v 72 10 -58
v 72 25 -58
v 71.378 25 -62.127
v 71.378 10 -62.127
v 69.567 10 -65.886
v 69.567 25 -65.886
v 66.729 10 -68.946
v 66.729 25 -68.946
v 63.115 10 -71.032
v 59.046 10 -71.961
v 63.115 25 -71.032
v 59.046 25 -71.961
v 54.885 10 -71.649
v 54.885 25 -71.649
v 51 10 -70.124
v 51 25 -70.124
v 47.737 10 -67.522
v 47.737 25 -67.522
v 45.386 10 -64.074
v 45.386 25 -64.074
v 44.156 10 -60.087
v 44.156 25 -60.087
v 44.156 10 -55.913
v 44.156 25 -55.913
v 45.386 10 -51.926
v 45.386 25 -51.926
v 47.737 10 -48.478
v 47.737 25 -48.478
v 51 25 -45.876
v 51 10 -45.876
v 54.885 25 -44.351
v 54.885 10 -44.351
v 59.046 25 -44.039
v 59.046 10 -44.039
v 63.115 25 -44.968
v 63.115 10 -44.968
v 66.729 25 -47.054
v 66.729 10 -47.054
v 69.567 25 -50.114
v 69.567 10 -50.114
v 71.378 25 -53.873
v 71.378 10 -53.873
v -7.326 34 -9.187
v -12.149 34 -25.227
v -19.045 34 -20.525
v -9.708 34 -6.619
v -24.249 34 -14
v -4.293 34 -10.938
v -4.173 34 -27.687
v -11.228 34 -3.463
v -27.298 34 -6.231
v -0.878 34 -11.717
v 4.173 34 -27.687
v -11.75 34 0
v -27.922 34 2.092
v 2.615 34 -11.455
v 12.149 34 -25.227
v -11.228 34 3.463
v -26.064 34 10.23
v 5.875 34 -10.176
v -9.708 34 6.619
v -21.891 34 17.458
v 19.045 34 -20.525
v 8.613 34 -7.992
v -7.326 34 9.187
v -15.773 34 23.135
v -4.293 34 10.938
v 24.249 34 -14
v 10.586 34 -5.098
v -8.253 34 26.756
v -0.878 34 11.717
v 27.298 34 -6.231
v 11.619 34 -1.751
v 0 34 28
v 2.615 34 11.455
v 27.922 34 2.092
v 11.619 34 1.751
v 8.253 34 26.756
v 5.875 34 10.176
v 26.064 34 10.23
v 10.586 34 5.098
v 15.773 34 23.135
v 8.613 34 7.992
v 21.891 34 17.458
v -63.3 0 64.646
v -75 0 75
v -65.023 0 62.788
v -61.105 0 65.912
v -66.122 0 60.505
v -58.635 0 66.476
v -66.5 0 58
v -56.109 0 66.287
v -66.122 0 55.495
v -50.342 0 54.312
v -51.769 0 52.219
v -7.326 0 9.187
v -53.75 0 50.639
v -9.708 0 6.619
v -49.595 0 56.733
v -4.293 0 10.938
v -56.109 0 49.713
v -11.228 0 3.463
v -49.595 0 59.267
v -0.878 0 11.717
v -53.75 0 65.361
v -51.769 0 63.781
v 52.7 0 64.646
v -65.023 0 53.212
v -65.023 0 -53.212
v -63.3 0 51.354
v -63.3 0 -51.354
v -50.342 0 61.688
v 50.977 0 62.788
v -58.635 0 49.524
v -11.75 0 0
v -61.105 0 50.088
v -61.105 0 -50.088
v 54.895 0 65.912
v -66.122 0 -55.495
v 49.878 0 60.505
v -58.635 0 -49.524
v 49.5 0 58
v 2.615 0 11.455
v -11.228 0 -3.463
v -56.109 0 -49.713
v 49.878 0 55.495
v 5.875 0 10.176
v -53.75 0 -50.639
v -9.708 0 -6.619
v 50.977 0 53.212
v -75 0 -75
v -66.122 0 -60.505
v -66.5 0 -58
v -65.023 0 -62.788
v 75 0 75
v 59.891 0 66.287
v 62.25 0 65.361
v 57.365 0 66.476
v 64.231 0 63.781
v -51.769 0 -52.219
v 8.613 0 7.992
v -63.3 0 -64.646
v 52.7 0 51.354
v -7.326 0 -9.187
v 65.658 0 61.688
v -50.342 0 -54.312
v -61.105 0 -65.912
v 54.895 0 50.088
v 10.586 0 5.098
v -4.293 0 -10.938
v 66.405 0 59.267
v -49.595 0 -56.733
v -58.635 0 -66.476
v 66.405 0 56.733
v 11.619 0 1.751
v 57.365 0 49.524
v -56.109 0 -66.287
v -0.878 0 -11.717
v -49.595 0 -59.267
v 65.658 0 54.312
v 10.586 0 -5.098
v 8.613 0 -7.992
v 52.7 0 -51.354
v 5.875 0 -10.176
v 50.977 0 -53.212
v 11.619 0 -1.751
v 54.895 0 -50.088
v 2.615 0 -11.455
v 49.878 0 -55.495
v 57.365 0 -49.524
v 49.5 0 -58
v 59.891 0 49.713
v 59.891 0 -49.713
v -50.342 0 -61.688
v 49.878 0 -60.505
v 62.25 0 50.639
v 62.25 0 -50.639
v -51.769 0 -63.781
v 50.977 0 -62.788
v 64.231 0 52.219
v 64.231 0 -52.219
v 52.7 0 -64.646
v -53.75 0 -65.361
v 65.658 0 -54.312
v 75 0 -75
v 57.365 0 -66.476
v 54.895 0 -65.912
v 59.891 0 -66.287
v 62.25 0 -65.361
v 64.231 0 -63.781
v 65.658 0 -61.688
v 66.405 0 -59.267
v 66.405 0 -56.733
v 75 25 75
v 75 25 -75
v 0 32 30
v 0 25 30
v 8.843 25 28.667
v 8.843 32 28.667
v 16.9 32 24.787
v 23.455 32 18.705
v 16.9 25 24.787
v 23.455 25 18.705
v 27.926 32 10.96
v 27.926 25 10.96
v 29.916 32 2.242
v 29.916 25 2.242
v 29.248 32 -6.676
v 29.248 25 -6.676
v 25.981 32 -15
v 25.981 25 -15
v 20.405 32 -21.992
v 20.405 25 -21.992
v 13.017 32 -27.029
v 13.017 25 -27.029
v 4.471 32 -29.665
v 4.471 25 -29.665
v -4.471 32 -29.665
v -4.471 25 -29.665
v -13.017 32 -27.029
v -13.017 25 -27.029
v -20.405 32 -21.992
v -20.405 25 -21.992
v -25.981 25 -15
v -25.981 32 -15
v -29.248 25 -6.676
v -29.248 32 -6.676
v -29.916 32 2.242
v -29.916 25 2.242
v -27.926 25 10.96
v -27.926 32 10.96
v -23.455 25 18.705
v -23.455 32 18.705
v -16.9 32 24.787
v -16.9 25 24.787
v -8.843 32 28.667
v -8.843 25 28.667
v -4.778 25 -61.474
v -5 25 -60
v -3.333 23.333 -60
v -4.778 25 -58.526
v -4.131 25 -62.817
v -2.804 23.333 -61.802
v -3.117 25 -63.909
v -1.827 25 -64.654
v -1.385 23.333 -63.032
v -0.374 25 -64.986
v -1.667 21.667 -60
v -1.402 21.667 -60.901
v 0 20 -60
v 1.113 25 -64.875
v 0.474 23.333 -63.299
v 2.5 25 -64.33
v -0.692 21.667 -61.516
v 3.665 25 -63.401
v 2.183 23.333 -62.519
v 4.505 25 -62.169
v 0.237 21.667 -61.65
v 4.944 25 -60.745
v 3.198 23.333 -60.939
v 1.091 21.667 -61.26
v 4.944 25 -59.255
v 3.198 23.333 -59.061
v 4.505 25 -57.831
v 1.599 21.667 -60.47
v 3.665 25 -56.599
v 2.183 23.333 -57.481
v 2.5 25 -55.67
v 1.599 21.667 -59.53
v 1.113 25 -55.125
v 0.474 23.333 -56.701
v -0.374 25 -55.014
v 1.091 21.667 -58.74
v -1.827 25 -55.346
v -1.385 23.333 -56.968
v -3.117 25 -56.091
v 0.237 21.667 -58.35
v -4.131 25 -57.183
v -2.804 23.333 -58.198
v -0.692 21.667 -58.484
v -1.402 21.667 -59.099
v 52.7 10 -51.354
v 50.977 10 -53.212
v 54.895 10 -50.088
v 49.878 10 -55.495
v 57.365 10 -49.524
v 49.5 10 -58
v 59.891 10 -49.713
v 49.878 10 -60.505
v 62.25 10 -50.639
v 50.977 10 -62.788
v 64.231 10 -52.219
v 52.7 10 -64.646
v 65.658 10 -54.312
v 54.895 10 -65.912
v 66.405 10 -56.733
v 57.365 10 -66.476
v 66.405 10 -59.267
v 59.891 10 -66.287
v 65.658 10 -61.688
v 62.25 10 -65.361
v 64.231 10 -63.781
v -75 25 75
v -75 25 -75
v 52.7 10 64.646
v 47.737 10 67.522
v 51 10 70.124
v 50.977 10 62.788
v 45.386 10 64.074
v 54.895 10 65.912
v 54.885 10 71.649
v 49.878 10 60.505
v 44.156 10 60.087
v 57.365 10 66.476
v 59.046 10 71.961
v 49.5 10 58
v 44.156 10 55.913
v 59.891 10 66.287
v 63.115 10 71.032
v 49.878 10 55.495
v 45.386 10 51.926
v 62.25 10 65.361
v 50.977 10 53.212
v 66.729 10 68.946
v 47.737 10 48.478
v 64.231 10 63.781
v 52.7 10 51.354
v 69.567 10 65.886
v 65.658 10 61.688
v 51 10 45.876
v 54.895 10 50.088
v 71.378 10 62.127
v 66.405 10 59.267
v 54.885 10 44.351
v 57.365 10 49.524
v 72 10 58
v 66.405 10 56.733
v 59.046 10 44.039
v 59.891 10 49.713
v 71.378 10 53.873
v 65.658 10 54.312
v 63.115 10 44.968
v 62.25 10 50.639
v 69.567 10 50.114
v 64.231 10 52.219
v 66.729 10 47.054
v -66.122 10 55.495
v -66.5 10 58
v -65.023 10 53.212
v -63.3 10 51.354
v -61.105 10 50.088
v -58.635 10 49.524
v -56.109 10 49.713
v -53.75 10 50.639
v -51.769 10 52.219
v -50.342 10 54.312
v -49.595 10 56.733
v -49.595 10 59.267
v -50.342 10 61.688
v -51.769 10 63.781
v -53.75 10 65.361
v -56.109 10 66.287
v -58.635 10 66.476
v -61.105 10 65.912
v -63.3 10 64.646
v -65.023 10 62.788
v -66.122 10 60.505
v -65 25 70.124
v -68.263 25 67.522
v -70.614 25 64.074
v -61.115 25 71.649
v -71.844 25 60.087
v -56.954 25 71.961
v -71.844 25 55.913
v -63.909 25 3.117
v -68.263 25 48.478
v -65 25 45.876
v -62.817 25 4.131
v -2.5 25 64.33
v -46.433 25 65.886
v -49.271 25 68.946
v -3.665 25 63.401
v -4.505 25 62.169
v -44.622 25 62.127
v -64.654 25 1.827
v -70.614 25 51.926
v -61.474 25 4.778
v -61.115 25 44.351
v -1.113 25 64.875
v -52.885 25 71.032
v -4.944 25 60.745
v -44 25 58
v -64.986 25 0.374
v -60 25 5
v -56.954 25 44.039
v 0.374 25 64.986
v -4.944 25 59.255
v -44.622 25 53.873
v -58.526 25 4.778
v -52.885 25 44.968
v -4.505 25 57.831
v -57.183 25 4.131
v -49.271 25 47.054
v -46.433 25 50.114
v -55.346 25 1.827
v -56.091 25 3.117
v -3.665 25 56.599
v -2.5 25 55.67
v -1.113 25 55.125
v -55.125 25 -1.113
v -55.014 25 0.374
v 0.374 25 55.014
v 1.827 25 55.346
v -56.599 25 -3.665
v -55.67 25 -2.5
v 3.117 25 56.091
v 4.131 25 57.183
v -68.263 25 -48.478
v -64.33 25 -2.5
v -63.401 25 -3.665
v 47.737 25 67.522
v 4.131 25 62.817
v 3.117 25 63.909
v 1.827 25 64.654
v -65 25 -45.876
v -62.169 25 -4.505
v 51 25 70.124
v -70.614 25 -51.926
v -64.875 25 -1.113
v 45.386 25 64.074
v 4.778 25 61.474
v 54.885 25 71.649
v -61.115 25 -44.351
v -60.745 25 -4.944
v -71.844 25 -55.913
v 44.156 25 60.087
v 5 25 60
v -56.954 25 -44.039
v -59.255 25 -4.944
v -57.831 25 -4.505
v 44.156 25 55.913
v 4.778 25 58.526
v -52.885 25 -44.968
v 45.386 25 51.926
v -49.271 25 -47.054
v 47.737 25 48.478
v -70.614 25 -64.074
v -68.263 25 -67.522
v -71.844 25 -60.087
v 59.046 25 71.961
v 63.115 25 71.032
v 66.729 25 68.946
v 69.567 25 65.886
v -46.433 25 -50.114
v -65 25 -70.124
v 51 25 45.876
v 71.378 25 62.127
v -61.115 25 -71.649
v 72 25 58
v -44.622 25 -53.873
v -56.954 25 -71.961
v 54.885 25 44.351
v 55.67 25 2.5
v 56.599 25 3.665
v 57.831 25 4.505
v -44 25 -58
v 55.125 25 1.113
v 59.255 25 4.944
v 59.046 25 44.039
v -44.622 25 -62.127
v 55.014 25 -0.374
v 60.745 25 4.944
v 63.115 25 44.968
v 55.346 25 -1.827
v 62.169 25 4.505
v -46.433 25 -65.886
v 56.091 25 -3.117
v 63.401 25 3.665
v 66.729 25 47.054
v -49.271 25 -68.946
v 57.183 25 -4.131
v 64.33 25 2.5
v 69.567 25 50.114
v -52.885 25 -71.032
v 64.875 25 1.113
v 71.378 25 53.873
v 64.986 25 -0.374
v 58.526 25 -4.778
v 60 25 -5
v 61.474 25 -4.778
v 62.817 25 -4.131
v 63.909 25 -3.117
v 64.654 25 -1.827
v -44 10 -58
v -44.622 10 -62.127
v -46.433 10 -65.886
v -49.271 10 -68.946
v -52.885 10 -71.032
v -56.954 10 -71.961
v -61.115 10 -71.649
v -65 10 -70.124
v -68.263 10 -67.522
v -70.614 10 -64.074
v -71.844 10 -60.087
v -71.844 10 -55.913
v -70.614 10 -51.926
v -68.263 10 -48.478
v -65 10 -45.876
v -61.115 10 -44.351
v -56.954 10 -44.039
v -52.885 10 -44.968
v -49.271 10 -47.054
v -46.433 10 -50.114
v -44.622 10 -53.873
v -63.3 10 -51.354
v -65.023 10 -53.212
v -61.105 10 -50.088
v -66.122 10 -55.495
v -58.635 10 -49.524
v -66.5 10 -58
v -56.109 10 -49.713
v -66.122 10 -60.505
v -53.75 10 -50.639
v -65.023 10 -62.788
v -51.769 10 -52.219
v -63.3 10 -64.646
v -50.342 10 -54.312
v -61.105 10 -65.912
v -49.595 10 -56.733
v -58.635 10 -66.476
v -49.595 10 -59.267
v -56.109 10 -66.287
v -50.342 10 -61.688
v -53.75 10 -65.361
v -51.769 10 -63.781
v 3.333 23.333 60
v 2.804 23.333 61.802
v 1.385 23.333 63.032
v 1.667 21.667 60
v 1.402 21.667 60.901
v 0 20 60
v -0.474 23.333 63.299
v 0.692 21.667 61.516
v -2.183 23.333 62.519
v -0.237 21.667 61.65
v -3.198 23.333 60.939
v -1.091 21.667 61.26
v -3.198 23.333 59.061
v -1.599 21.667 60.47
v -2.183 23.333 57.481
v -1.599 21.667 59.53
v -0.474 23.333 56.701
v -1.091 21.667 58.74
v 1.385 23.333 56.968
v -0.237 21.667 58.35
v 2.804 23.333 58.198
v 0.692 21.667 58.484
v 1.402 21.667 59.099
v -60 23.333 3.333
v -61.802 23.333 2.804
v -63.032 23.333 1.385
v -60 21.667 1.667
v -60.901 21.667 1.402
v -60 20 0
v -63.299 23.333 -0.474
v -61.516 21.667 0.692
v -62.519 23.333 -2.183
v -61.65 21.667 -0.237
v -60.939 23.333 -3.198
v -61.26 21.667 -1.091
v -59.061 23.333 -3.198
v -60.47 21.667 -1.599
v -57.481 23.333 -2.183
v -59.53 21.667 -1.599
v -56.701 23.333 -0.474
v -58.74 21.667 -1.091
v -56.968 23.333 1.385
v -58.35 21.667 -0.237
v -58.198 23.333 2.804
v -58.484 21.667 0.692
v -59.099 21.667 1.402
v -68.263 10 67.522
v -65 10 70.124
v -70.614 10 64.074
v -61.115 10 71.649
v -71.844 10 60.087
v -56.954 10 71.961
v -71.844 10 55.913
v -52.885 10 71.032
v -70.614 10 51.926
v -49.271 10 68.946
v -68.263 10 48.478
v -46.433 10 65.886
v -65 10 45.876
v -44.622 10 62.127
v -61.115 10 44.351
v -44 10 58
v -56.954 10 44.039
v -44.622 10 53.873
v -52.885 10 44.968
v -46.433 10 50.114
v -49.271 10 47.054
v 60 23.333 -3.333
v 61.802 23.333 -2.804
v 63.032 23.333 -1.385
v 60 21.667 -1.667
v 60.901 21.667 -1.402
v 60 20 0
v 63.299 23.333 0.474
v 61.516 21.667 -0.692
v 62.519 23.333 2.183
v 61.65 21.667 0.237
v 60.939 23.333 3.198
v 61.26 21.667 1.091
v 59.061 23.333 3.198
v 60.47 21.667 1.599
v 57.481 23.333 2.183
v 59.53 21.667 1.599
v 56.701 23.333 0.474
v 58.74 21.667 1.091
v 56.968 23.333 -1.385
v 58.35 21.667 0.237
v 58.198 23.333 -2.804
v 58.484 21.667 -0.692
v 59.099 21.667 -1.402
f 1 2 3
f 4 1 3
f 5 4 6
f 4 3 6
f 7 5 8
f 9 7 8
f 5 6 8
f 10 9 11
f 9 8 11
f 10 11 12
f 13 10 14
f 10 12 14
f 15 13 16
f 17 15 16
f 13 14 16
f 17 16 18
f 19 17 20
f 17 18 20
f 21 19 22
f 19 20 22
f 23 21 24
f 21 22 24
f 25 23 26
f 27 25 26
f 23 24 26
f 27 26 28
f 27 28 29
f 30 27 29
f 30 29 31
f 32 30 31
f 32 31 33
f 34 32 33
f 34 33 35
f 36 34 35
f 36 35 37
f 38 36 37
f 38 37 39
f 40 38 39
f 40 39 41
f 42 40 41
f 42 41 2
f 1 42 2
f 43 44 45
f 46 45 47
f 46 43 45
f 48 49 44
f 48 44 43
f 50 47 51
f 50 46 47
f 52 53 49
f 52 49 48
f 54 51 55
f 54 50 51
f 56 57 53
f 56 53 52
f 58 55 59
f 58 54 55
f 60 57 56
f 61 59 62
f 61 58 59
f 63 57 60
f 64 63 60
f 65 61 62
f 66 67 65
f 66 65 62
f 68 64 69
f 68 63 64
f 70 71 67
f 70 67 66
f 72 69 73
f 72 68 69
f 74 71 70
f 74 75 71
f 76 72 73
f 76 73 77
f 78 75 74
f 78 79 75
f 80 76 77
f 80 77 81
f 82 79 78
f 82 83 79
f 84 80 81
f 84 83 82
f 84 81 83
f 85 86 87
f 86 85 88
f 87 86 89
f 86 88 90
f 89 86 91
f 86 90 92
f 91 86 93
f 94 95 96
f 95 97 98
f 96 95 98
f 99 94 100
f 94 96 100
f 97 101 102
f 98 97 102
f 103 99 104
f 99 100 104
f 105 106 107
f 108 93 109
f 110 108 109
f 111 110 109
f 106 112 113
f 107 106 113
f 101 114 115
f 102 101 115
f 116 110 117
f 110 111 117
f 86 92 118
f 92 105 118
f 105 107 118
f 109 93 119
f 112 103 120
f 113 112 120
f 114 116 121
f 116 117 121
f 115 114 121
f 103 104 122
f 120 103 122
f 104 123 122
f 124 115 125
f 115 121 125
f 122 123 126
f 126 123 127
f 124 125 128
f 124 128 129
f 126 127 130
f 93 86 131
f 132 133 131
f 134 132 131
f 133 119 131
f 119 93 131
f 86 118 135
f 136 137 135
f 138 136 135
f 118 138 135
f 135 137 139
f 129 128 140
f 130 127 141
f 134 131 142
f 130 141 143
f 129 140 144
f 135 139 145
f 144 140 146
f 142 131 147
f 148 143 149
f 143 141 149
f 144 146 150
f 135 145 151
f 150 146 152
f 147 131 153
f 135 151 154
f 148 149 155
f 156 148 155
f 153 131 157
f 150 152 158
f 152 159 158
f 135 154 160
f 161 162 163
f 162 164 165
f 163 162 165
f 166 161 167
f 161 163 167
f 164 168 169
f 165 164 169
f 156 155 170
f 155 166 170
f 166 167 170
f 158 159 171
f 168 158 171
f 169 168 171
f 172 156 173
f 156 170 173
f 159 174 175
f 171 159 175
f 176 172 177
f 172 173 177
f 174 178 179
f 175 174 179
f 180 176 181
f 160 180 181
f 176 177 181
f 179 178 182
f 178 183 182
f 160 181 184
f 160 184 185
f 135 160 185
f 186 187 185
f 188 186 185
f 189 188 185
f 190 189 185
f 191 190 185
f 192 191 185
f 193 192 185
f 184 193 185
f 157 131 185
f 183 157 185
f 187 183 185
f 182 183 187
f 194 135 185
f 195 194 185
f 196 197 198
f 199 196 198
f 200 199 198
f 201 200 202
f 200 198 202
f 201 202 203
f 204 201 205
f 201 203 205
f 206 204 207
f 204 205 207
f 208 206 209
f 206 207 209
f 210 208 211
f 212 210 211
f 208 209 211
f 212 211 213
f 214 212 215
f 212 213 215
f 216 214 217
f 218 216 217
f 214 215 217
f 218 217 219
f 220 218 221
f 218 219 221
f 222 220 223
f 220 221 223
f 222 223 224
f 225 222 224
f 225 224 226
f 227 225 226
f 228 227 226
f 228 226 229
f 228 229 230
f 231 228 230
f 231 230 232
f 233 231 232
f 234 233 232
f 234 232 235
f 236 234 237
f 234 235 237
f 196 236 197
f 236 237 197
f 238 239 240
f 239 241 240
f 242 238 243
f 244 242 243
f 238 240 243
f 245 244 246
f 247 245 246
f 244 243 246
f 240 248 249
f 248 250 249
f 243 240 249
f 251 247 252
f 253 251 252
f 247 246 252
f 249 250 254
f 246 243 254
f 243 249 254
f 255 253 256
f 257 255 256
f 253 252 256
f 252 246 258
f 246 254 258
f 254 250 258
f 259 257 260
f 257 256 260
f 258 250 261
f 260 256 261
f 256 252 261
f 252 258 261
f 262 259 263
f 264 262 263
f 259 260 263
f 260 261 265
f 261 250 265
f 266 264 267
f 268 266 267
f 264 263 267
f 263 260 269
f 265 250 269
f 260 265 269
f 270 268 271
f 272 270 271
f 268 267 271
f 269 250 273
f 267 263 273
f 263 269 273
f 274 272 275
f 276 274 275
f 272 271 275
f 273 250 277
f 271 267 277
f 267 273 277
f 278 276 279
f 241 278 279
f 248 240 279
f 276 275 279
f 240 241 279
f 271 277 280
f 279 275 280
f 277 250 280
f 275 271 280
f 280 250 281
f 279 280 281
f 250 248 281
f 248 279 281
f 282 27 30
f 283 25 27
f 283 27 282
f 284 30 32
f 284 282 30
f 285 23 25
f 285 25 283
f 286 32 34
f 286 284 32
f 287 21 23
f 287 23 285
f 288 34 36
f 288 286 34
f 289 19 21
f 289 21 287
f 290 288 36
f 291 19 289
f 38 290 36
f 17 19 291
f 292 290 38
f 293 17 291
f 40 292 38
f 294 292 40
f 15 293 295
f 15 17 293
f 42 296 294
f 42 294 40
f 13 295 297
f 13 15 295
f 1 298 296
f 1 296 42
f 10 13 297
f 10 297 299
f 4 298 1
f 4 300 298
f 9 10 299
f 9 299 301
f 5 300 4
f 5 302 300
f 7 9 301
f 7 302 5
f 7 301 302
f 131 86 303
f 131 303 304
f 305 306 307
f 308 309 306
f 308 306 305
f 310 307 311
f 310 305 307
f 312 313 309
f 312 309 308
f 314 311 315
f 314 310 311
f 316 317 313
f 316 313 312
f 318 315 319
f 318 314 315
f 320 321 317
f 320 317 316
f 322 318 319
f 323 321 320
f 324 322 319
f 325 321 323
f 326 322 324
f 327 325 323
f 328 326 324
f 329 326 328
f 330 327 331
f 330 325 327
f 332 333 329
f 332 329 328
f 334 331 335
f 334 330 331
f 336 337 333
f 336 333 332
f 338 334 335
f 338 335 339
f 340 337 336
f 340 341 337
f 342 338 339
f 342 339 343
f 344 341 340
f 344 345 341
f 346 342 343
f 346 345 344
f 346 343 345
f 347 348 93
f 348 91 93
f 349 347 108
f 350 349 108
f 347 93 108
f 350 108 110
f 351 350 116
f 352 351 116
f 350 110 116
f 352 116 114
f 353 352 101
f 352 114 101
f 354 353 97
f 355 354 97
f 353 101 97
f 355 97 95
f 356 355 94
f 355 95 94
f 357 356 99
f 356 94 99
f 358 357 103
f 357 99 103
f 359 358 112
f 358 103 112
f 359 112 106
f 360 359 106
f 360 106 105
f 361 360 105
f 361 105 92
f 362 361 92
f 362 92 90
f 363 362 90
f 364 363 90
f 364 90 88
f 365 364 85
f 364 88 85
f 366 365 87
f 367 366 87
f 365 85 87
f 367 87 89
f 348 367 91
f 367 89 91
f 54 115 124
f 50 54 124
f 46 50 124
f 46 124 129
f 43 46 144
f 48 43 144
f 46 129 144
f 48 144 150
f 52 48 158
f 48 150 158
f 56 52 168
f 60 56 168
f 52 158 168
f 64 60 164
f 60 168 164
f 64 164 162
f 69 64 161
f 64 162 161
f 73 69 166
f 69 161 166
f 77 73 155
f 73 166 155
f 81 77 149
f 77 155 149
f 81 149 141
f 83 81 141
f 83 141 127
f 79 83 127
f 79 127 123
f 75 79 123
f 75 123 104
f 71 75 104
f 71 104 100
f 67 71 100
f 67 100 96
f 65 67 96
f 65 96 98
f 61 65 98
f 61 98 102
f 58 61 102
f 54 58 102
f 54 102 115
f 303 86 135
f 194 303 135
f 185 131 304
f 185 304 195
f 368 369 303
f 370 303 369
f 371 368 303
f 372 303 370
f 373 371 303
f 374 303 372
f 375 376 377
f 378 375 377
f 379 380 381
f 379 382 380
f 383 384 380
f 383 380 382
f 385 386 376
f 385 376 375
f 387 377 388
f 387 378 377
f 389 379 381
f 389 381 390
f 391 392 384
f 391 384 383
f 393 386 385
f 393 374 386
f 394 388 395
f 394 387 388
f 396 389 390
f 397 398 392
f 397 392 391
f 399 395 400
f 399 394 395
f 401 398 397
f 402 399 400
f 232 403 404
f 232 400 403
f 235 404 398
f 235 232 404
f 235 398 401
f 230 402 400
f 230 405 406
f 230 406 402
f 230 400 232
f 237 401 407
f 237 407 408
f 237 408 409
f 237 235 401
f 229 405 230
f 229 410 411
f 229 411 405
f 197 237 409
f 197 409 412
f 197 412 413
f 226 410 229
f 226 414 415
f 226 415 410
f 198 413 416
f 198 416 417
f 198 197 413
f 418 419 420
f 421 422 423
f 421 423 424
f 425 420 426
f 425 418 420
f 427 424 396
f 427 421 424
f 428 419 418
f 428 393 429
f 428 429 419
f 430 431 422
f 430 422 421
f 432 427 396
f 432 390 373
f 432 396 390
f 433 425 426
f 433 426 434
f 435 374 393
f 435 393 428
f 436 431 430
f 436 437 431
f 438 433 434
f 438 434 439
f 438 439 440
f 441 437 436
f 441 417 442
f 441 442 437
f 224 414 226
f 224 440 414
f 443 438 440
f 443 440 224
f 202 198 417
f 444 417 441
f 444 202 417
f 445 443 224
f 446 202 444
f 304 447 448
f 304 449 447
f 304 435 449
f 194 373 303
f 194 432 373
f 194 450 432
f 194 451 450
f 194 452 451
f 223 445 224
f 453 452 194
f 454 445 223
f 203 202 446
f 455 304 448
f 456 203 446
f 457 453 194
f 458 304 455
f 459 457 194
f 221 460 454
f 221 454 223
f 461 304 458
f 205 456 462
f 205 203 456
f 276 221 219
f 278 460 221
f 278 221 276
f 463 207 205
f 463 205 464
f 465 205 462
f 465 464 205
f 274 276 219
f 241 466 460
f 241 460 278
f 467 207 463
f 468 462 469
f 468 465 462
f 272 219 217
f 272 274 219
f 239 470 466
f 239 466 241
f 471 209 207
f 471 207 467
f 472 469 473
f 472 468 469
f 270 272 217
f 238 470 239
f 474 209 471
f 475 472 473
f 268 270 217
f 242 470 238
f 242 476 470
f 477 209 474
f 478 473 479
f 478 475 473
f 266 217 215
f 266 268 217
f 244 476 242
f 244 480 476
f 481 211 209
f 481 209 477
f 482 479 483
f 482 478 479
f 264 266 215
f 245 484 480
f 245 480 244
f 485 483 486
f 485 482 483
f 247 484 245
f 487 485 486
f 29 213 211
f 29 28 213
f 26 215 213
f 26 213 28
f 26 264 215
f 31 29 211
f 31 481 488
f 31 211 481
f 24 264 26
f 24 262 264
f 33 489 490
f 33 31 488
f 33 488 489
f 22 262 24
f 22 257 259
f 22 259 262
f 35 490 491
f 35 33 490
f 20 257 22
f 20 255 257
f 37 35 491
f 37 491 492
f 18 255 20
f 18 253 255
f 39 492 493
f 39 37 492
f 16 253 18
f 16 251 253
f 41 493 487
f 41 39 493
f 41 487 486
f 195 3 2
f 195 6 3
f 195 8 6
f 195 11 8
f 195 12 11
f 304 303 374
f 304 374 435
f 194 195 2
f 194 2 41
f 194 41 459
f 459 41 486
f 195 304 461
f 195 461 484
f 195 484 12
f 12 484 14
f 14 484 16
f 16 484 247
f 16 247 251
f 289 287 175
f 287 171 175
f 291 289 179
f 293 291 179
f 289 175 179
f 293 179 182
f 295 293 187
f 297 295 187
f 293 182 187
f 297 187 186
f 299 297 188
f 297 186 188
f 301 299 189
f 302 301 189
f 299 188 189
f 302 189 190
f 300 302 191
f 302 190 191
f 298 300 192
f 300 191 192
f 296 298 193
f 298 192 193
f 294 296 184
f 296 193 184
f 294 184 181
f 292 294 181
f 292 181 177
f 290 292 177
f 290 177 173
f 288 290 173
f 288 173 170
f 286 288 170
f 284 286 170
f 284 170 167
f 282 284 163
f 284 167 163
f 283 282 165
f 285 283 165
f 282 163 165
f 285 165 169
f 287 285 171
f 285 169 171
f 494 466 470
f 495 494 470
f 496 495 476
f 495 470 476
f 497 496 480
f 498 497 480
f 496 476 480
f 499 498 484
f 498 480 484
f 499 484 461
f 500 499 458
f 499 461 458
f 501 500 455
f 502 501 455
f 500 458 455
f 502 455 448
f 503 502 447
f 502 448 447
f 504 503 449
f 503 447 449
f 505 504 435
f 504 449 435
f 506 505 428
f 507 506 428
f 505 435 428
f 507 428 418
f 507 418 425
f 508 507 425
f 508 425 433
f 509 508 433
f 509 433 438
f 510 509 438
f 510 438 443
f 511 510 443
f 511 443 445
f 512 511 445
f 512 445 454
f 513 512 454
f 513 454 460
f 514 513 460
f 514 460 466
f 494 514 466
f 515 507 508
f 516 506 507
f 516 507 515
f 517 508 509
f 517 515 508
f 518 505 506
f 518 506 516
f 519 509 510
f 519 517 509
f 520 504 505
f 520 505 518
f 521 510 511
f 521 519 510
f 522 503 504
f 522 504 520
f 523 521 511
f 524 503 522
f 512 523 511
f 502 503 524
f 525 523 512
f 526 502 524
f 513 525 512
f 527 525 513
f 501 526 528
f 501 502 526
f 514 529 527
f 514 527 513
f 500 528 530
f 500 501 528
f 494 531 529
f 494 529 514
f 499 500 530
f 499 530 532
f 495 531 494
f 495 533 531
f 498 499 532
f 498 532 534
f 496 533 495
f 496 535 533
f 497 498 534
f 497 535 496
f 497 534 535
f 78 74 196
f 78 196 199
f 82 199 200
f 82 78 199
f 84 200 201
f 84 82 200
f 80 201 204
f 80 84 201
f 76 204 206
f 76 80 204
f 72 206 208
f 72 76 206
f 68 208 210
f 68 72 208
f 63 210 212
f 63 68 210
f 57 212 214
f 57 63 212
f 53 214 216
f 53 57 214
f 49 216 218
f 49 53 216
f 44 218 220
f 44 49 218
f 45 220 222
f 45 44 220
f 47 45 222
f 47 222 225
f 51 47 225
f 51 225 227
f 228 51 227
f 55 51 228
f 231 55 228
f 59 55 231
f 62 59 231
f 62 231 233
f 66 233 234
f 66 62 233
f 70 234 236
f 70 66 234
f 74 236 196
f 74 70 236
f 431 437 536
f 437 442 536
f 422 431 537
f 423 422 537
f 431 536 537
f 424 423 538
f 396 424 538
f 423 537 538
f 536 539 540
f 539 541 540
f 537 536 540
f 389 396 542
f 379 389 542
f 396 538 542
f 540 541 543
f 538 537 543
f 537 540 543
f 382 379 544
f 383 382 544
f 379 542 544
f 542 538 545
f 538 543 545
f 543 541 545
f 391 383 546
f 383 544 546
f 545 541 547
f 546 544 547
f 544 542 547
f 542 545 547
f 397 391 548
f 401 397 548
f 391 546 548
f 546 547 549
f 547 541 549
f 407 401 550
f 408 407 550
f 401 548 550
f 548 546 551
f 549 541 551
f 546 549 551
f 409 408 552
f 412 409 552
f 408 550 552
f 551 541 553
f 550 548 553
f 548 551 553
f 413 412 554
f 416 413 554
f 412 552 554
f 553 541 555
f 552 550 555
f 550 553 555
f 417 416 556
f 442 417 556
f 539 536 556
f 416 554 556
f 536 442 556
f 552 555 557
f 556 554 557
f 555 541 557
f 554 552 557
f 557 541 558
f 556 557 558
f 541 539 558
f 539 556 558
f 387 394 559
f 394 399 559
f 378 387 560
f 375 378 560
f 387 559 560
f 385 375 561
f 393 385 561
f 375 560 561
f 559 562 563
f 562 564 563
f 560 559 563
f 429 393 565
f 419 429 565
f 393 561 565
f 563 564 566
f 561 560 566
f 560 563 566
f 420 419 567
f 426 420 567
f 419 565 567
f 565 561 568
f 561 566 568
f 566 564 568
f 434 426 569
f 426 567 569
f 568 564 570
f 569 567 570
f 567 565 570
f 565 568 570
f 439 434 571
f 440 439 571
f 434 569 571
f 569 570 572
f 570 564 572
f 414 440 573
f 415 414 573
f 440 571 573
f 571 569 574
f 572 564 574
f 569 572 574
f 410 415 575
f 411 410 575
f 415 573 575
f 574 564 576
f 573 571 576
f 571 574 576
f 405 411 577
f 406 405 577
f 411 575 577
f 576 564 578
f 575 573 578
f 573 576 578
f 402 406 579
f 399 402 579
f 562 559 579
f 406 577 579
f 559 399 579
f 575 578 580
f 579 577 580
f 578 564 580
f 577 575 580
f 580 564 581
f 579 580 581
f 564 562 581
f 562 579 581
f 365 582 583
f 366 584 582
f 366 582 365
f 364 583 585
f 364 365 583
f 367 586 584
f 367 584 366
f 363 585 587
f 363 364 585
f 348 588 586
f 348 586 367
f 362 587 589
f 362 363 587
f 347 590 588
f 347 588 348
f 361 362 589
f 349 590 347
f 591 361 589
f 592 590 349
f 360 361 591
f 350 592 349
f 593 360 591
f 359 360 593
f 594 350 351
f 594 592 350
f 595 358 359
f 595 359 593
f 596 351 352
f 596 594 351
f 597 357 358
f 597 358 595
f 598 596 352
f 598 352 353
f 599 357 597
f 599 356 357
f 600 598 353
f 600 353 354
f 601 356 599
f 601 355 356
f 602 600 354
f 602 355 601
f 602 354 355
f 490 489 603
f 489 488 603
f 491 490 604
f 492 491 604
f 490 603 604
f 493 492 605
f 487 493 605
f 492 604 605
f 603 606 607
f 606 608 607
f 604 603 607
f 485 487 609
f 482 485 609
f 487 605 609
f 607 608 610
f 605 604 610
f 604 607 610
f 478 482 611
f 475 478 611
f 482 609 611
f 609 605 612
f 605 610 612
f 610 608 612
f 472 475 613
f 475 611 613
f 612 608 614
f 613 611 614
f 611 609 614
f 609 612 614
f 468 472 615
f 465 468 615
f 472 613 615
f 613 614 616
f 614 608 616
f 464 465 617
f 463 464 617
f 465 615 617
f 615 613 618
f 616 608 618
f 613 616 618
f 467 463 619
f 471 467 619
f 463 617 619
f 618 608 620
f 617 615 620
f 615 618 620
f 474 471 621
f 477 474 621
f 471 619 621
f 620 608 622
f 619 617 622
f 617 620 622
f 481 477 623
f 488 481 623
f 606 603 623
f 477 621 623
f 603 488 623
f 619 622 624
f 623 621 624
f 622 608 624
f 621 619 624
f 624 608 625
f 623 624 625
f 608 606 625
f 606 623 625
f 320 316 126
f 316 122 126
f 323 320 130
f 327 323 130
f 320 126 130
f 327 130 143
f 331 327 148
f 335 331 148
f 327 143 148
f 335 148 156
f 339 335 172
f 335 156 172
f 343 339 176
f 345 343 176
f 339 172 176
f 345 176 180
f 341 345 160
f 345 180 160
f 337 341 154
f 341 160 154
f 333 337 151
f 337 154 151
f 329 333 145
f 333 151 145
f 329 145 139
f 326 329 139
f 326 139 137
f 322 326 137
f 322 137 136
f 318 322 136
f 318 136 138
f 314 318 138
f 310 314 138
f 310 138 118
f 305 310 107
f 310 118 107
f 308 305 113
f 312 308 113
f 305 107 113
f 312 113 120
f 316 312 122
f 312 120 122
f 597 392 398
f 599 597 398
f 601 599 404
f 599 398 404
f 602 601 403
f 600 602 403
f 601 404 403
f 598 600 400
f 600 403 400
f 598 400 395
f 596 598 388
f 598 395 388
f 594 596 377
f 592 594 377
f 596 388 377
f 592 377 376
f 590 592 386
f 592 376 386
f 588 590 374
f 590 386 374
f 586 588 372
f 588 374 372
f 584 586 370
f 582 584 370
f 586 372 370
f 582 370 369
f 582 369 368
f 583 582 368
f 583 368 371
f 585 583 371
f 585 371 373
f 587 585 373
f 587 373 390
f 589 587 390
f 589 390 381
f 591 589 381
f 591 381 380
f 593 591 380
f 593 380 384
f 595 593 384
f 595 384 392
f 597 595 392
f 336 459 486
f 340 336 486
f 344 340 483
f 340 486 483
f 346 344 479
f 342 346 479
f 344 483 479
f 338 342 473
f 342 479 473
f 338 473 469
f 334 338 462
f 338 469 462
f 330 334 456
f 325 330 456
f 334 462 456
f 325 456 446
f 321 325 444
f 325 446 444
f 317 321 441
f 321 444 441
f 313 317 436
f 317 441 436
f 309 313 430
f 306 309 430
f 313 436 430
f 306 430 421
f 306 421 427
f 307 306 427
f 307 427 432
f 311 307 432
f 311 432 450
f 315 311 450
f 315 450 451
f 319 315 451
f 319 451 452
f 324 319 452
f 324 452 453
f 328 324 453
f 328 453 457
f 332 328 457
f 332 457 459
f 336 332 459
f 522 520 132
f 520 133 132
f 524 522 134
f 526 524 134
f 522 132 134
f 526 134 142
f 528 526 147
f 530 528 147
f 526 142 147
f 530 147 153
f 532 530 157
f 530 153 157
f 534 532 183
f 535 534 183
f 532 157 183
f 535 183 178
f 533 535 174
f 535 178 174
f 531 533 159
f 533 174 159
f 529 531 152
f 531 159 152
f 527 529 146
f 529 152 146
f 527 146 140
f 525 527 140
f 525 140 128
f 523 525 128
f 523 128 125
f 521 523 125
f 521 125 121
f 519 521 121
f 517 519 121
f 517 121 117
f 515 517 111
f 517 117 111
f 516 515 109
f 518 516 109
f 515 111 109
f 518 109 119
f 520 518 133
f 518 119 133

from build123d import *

# Parameters (mm, degrees)
SKETCH1_W              = 150
SKETCH1_H              = 150
BOSS_EXTRUDE1_DEPTH    = 25
SKETCH2_R              = 30
BOSS_EXTRUDE2_DEPTH    = 9
CHAMFER1_SIZE          = 2
M25X1_5_TAPPED_HOLE1_D = 23.5
HOLE1_D                = 17
HOLE1_CBORE_D          = 28
HOLE1_CBORE_DEPTH      = 15
CIRPATTERN1_COUNT      = 4


with BuildPart() as part:
    # Sketch1 → Boss-Extrude1 (new body)
    with BuildSketch(Plane(origin=(0, 0, 0), x_dir=(1, 0, 0), z_dir=(0, 1, 0))):
        Rectangle(SKETCH1_W, SKETCH1_H)
    extrude(amount=BOSS_EXTRUDE1_DEPTH)

    # Sketch2 → Boss-Extrude2 (add)
    with BuildSketch(Plane(origin=(0, 25, 0), x_dir=(1, 0, 0), z_dir=(0, 1, 0))):
        with Locations(Location((0, 0, 0), (0, 0, 270))):
            Circle(SKETCH2_R)
    extrude(amount=BOSS_EXTRUDE2_DEPTH)

    # Chamfer1
    chamfer1_edges = [part.edges().sort_by_distance(p)[0] for p in [
        (0, 34, -30),
    ]]
    chamfer(chamfer1_edges, length=CHAMFER1_SIZE)

    # M25x1.5 Tapped Hole1 (through all)
    with Locations(Plane(origin=(0, 34, 0), x_dir=(1, 0, 0), z_dir=(0, 1, 0))):
        with Locations((0, 0)):
            Hole(M25X1_5_TAPPED_HOLE1_D / 2)

    # Hole1 (through all)
    with Locations(Plane(origin=(0, 25, 0), x_dir=(1, 0, 0), z_dir=(0, 1, 0))):
        with Locations((-58, 58), (58, 58), (-58, -58), (58, -58)):
            CounterBoreHole(HOLE1_D / 2, HOLE1_CBORE_D / 2, HOLE1_CBORE_DEPTH)

    # Sketch7 → Cut-Revolve1 (revolve, cut)
    with BuildSketch(Plane.XY, mode=Mode.PRIVATE) as cut_revolve1_sk:
        Polygon((-65, 25), (-60, 20), (-60, 25), align=None)
    cut_revolve1 = revolve(cut_revolve1_sk.sketch.rotate(Axis((-60, 28.226297144, 0), (0, -1, 0)), 270), axis=Axis((-60, 28.226297144, 0), (0, -1, 0)), mode=Mode.SUBTRACT)

    # CirPattern1: Cut-Revolve1 ×4 about axis
    cirpattern1_axis = Axis((0, 0, 0), (0, 1, 0))
    for i in range(1, CIRPATTERN1_COUNT):
        add(cut_revolve1.rotate(cirpattern1_axis, i * 360 / CIRPATTERN1_COUNT), mode=Mode.SUBTRACT)


solid = part.part
